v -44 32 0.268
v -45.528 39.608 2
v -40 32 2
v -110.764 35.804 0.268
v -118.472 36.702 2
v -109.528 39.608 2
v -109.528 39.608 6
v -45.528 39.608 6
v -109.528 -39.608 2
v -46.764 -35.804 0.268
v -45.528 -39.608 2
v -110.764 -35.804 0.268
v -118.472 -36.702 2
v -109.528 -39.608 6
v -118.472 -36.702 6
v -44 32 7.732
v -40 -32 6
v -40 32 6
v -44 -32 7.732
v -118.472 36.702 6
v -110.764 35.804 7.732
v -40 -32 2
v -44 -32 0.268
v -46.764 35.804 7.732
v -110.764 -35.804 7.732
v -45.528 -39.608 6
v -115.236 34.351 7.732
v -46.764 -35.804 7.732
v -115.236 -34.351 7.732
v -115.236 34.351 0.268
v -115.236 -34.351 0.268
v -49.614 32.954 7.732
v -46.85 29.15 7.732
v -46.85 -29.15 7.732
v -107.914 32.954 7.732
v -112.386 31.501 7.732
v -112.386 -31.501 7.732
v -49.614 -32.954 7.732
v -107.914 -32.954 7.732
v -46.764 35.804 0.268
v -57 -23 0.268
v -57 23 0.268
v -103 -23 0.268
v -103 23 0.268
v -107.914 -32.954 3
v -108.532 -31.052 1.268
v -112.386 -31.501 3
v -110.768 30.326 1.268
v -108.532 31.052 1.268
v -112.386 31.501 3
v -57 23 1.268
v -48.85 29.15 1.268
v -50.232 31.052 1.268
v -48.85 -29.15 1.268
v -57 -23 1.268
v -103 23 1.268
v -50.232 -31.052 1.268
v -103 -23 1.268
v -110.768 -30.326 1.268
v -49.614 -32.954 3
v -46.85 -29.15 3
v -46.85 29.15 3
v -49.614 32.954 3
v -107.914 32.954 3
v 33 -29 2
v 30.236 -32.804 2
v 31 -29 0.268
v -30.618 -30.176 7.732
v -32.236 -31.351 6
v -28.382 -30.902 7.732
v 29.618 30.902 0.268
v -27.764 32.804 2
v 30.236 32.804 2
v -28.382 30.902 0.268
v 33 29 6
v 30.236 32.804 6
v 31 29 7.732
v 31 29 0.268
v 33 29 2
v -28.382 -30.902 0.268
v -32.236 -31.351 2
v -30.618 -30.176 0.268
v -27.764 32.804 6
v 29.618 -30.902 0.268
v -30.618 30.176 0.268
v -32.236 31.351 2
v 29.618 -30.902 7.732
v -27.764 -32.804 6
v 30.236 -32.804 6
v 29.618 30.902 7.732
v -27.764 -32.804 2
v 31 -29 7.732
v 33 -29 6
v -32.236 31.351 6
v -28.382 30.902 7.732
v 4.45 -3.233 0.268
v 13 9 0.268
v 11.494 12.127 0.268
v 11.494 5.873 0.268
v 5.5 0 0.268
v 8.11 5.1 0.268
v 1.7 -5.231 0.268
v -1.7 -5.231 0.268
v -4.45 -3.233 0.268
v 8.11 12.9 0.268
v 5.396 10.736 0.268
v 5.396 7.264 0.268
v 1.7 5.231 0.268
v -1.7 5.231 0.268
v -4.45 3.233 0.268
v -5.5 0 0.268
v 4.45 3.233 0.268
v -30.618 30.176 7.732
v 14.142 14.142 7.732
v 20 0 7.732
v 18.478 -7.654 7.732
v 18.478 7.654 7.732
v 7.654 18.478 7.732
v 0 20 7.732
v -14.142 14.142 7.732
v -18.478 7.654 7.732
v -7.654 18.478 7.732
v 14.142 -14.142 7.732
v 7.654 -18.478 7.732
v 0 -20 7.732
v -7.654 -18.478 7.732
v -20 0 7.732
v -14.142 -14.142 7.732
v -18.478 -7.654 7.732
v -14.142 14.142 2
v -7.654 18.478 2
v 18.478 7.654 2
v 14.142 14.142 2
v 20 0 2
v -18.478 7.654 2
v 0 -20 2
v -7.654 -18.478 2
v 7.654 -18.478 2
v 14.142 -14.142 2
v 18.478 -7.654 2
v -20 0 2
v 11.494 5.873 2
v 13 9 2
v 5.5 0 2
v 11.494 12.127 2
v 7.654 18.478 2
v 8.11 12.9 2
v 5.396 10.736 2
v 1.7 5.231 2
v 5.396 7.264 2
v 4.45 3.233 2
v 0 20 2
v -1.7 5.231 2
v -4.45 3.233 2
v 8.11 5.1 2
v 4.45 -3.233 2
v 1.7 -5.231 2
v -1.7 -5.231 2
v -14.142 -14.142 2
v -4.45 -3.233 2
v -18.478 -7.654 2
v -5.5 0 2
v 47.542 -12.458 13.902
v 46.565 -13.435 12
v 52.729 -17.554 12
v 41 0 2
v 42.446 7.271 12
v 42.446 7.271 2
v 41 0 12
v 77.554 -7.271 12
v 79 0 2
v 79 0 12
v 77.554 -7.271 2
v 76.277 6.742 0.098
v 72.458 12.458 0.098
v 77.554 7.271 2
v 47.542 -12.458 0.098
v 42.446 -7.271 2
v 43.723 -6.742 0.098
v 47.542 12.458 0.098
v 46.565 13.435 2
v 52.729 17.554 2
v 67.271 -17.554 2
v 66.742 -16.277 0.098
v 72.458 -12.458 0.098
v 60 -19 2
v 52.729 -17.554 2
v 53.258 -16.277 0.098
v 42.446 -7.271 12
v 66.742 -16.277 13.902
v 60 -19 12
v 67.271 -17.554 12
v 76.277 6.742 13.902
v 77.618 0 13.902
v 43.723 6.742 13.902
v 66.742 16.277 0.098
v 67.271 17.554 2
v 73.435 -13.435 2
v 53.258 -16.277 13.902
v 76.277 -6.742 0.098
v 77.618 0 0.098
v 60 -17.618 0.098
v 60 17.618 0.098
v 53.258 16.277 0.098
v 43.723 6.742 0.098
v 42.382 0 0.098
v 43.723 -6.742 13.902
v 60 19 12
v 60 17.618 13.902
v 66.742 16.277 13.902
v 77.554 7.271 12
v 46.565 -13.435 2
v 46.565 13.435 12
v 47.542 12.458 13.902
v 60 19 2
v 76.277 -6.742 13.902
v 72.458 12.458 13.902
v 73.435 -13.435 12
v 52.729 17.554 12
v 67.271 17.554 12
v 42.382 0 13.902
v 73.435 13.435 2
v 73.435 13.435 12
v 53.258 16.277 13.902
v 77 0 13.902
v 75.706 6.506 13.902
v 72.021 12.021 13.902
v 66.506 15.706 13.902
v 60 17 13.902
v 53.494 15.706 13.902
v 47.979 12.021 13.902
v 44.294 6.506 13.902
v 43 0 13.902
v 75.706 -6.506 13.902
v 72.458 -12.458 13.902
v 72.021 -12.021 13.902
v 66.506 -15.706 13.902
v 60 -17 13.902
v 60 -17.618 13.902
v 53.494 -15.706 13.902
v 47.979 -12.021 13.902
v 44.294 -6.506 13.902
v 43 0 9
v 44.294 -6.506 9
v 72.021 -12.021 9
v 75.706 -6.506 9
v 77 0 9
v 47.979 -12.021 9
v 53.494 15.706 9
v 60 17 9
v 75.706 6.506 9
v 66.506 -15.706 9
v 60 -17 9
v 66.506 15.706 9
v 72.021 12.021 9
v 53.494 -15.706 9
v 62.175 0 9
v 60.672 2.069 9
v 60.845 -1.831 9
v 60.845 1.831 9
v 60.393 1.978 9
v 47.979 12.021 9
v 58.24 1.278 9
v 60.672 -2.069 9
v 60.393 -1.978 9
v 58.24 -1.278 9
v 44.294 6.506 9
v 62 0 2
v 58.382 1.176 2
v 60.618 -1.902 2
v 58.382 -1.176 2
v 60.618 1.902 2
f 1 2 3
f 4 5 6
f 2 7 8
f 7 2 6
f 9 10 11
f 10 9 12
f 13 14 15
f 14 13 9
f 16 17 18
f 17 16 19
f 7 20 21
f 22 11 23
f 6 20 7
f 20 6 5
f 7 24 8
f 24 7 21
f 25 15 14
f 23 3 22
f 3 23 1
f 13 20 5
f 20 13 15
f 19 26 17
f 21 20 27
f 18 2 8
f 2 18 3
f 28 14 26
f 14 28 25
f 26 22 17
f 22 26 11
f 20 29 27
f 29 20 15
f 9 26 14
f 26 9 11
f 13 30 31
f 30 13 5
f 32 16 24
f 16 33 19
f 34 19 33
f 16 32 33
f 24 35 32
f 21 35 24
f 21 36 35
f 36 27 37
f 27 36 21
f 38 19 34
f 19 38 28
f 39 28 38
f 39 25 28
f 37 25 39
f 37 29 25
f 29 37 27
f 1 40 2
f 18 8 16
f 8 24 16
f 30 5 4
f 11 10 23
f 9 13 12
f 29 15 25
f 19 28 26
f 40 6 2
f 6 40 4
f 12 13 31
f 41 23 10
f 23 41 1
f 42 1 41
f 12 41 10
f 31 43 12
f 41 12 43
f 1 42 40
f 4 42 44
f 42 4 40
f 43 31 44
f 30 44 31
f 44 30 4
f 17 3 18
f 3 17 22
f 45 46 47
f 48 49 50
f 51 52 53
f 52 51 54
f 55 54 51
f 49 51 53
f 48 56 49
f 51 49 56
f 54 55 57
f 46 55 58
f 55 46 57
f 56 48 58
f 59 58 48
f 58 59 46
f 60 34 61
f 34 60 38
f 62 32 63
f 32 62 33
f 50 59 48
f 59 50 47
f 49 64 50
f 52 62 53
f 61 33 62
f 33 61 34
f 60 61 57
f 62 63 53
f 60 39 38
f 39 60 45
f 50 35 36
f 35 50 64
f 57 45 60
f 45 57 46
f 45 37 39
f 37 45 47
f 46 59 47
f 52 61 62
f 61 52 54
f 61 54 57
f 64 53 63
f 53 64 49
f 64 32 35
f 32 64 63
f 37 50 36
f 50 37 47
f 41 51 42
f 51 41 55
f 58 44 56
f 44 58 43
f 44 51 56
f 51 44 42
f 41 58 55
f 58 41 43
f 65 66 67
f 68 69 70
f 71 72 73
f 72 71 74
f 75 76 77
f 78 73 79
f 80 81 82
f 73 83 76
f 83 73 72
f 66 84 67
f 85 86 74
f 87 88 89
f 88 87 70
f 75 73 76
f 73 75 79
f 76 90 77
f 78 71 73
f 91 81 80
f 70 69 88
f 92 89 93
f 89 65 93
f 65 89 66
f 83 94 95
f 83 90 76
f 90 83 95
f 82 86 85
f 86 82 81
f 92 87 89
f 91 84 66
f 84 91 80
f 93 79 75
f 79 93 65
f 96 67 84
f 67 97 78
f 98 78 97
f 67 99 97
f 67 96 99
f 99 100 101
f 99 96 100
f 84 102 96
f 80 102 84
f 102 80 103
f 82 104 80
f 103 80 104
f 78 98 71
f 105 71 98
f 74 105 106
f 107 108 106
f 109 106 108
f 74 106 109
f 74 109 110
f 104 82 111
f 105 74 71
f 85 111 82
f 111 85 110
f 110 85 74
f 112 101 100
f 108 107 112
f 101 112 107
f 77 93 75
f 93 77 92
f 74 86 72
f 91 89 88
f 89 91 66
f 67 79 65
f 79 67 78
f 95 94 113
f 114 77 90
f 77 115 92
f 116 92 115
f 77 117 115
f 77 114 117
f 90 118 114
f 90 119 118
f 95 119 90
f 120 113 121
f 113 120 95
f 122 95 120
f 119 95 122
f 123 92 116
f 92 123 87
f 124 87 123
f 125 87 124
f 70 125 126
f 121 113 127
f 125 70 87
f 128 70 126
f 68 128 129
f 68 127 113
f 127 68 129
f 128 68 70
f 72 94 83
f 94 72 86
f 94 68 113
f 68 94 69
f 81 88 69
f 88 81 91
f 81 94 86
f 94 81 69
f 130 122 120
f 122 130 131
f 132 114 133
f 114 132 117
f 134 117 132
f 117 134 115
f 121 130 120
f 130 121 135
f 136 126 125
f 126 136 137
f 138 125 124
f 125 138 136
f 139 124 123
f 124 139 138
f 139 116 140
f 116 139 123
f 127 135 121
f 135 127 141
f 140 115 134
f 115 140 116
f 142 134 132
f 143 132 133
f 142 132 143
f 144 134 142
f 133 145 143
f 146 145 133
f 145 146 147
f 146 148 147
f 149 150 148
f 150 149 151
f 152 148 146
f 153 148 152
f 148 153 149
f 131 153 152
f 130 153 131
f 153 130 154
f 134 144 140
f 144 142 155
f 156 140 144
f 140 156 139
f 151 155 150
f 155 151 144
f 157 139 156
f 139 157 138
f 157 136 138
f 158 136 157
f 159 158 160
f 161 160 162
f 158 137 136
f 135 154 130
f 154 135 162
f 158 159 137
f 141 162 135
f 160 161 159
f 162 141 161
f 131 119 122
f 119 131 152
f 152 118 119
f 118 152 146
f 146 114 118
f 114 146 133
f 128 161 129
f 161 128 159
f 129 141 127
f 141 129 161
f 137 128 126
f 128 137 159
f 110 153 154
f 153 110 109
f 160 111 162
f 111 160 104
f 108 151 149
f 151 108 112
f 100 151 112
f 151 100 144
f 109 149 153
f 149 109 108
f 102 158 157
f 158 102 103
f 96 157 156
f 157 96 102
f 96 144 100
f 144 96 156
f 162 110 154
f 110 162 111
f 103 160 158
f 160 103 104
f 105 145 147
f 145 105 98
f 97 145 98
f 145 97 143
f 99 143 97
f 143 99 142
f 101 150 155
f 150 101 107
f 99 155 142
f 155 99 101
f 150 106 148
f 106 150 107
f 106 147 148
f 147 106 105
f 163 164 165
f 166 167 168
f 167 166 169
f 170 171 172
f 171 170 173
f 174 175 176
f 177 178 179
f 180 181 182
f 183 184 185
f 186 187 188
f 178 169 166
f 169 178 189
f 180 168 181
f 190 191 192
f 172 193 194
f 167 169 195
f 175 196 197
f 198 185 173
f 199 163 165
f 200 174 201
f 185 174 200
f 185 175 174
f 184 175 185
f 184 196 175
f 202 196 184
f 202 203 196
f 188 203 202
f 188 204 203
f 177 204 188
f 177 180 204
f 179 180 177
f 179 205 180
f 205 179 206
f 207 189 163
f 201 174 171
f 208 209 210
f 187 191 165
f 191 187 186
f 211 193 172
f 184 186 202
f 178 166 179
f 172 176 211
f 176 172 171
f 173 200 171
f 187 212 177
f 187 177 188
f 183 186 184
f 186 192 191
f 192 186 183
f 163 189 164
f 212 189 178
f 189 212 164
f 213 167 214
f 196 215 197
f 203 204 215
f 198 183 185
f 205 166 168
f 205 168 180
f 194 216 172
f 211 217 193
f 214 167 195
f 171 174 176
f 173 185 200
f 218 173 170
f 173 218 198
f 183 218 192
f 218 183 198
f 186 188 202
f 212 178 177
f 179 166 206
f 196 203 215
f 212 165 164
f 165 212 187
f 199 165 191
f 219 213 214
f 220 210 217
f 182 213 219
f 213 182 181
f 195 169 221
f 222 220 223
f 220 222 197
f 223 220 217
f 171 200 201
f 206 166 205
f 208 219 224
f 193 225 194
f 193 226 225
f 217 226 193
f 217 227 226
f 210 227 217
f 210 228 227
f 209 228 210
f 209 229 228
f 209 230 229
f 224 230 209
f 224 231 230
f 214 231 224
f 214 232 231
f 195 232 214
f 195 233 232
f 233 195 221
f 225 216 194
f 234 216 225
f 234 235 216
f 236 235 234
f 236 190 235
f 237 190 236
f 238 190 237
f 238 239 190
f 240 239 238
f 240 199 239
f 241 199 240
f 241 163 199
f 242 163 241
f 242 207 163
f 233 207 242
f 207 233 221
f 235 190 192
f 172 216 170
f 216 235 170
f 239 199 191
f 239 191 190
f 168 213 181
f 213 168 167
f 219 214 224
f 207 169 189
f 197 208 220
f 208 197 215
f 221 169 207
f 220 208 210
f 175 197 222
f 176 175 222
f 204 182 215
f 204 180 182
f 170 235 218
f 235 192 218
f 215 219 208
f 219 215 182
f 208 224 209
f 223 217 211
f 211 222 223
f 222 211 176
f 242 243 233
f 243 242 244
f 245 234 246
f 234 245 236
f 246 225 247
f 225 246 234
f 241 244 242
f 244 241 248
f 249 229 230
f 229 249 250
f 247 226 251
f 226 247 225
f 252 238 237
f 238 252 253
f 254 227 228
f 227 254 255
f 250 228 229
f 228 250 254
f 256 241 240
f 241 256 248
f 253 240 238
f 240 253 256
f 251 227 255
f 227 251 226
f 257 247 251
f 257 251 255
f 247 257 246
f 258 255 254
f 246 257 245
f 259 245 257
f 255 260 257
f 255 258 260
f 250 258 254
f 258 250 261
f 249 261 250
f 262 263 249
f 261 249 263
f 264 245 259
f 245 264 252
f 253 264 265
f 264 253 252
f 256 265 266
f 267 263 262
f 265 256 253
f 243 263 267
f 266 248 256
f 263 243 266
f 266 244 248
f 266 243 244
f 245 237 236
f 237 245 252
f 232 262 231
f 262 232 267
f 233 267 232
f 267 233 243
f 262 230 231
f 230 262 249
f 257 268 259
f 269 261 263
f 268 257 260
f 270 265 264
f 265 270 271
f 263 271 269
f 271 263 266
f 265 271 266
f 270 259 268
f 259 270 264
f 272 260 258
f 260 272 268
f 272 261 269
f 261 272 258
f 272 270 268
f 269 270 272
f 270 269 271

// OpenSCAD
// [FL_INDEX: keywords="openscad, 3d_parametric, Light_Dimmer_knob_and_plate, csg_solid" | COT="Parametric OpenSCAD design from 3DCodeverse"]
// Title: Light Dimmer knob and plate

// Light Dimmer Switch Plate and Knob
// (c) 2013 Wouter Robers

Knob="yes";//[yes,no]
KnobDiameter=38;
KnopHoleDiameter=4;


Plate="yes";//[yes,no]
PlateSize=66;
PlateRoundEdge=4;
PlateHoleDiameter=11;
PlateThickness=8;

Rack="yes";//[yes,no]
RackSize=80;
RackRoundEdge=8;
RackThickness=PlateThickness;

Smoothness=8;// [8:Rough,30:Medium,60:Smooth]

$fa=180/Smoothness;
$fs=30/Smoothness;


if(Rack=="yes"){
translate([-RackSize,0,0])
difference(){
translate([0,0,RackThickness/2]) scale([RackRoundEdge/2,RackRoundEdge/2,1]) rcube([RackSize/(RackRoundEdge/2),RackSize/(RackRoundEdge/2),RackThickness],2);
translate([0,0,PlateThickness/2+2]) scale([PlateRoundEdge/2,PlateRoundEdge/2,1]) rcube([(PlateSize+0.3)/(PlateRoundEdge/2),(PlateSize+0.3)/(PlateRoundEdge/2),PlateThickness+2],2);
cube(PlateSize-20,center=true);
}
}


if(Plate=="yes"){
difference(){
translate([0,0,PlateThickness/2]) scale([PlateRoundEdge/2,PlateRoundEdge/2,1]) rcube([PlateSize/(PlateRoundEdge/2),PlateSize/(PlateRoundEdge/2),PlateThickness],2);
translate([0,0,2]) cylinder(r=KnobDiameter/2+1,h=PlateThickness);
translate([0,0,-2]) cylinder(r=PlateHoleDiameter/2,h=PlateThickness);
translate([9,9,-2]) cylinder(r=4,h=PlateThickness);
}
}

if(Knob=="yes"){
translate([60,0,14]) rotate([180,0,0])
difference(){
translate([0,0,7]) rcylinder(KnobDiameter/2,KnobDiameter/2,h=14);
translate([0,0,-1]) cylinder(r=KnobDiameter/2-2,h=6);
translate([0,0,4]) cylinder(r1=KnopHoleDiameter/2*1.1,r2=KnopHoleDiameter/2,h=8);
}
}


module rcube(Size=[20,20,20],b=2)
{hull(){for(x=[-(Size[0]/2-b),(Size[0]/2-b)]){for(y=[-(Size[1]/2-b),(Size[1]/2-b)]){for(z=[-(Size[2]/2-b),(Size[2]/2-b)]){ translate([x,y,z]) sphere(b);}}}}}


module rcylinder(r1=10,r2=10,h=10,b=2)
{translate([0,0,-h/2]) hull(){rotate_extrude() translate([r1-b,b,0]) circle(r = b); rotate_extrude() translate([r2-b, h-b, 0]) circle(r = b);}}
